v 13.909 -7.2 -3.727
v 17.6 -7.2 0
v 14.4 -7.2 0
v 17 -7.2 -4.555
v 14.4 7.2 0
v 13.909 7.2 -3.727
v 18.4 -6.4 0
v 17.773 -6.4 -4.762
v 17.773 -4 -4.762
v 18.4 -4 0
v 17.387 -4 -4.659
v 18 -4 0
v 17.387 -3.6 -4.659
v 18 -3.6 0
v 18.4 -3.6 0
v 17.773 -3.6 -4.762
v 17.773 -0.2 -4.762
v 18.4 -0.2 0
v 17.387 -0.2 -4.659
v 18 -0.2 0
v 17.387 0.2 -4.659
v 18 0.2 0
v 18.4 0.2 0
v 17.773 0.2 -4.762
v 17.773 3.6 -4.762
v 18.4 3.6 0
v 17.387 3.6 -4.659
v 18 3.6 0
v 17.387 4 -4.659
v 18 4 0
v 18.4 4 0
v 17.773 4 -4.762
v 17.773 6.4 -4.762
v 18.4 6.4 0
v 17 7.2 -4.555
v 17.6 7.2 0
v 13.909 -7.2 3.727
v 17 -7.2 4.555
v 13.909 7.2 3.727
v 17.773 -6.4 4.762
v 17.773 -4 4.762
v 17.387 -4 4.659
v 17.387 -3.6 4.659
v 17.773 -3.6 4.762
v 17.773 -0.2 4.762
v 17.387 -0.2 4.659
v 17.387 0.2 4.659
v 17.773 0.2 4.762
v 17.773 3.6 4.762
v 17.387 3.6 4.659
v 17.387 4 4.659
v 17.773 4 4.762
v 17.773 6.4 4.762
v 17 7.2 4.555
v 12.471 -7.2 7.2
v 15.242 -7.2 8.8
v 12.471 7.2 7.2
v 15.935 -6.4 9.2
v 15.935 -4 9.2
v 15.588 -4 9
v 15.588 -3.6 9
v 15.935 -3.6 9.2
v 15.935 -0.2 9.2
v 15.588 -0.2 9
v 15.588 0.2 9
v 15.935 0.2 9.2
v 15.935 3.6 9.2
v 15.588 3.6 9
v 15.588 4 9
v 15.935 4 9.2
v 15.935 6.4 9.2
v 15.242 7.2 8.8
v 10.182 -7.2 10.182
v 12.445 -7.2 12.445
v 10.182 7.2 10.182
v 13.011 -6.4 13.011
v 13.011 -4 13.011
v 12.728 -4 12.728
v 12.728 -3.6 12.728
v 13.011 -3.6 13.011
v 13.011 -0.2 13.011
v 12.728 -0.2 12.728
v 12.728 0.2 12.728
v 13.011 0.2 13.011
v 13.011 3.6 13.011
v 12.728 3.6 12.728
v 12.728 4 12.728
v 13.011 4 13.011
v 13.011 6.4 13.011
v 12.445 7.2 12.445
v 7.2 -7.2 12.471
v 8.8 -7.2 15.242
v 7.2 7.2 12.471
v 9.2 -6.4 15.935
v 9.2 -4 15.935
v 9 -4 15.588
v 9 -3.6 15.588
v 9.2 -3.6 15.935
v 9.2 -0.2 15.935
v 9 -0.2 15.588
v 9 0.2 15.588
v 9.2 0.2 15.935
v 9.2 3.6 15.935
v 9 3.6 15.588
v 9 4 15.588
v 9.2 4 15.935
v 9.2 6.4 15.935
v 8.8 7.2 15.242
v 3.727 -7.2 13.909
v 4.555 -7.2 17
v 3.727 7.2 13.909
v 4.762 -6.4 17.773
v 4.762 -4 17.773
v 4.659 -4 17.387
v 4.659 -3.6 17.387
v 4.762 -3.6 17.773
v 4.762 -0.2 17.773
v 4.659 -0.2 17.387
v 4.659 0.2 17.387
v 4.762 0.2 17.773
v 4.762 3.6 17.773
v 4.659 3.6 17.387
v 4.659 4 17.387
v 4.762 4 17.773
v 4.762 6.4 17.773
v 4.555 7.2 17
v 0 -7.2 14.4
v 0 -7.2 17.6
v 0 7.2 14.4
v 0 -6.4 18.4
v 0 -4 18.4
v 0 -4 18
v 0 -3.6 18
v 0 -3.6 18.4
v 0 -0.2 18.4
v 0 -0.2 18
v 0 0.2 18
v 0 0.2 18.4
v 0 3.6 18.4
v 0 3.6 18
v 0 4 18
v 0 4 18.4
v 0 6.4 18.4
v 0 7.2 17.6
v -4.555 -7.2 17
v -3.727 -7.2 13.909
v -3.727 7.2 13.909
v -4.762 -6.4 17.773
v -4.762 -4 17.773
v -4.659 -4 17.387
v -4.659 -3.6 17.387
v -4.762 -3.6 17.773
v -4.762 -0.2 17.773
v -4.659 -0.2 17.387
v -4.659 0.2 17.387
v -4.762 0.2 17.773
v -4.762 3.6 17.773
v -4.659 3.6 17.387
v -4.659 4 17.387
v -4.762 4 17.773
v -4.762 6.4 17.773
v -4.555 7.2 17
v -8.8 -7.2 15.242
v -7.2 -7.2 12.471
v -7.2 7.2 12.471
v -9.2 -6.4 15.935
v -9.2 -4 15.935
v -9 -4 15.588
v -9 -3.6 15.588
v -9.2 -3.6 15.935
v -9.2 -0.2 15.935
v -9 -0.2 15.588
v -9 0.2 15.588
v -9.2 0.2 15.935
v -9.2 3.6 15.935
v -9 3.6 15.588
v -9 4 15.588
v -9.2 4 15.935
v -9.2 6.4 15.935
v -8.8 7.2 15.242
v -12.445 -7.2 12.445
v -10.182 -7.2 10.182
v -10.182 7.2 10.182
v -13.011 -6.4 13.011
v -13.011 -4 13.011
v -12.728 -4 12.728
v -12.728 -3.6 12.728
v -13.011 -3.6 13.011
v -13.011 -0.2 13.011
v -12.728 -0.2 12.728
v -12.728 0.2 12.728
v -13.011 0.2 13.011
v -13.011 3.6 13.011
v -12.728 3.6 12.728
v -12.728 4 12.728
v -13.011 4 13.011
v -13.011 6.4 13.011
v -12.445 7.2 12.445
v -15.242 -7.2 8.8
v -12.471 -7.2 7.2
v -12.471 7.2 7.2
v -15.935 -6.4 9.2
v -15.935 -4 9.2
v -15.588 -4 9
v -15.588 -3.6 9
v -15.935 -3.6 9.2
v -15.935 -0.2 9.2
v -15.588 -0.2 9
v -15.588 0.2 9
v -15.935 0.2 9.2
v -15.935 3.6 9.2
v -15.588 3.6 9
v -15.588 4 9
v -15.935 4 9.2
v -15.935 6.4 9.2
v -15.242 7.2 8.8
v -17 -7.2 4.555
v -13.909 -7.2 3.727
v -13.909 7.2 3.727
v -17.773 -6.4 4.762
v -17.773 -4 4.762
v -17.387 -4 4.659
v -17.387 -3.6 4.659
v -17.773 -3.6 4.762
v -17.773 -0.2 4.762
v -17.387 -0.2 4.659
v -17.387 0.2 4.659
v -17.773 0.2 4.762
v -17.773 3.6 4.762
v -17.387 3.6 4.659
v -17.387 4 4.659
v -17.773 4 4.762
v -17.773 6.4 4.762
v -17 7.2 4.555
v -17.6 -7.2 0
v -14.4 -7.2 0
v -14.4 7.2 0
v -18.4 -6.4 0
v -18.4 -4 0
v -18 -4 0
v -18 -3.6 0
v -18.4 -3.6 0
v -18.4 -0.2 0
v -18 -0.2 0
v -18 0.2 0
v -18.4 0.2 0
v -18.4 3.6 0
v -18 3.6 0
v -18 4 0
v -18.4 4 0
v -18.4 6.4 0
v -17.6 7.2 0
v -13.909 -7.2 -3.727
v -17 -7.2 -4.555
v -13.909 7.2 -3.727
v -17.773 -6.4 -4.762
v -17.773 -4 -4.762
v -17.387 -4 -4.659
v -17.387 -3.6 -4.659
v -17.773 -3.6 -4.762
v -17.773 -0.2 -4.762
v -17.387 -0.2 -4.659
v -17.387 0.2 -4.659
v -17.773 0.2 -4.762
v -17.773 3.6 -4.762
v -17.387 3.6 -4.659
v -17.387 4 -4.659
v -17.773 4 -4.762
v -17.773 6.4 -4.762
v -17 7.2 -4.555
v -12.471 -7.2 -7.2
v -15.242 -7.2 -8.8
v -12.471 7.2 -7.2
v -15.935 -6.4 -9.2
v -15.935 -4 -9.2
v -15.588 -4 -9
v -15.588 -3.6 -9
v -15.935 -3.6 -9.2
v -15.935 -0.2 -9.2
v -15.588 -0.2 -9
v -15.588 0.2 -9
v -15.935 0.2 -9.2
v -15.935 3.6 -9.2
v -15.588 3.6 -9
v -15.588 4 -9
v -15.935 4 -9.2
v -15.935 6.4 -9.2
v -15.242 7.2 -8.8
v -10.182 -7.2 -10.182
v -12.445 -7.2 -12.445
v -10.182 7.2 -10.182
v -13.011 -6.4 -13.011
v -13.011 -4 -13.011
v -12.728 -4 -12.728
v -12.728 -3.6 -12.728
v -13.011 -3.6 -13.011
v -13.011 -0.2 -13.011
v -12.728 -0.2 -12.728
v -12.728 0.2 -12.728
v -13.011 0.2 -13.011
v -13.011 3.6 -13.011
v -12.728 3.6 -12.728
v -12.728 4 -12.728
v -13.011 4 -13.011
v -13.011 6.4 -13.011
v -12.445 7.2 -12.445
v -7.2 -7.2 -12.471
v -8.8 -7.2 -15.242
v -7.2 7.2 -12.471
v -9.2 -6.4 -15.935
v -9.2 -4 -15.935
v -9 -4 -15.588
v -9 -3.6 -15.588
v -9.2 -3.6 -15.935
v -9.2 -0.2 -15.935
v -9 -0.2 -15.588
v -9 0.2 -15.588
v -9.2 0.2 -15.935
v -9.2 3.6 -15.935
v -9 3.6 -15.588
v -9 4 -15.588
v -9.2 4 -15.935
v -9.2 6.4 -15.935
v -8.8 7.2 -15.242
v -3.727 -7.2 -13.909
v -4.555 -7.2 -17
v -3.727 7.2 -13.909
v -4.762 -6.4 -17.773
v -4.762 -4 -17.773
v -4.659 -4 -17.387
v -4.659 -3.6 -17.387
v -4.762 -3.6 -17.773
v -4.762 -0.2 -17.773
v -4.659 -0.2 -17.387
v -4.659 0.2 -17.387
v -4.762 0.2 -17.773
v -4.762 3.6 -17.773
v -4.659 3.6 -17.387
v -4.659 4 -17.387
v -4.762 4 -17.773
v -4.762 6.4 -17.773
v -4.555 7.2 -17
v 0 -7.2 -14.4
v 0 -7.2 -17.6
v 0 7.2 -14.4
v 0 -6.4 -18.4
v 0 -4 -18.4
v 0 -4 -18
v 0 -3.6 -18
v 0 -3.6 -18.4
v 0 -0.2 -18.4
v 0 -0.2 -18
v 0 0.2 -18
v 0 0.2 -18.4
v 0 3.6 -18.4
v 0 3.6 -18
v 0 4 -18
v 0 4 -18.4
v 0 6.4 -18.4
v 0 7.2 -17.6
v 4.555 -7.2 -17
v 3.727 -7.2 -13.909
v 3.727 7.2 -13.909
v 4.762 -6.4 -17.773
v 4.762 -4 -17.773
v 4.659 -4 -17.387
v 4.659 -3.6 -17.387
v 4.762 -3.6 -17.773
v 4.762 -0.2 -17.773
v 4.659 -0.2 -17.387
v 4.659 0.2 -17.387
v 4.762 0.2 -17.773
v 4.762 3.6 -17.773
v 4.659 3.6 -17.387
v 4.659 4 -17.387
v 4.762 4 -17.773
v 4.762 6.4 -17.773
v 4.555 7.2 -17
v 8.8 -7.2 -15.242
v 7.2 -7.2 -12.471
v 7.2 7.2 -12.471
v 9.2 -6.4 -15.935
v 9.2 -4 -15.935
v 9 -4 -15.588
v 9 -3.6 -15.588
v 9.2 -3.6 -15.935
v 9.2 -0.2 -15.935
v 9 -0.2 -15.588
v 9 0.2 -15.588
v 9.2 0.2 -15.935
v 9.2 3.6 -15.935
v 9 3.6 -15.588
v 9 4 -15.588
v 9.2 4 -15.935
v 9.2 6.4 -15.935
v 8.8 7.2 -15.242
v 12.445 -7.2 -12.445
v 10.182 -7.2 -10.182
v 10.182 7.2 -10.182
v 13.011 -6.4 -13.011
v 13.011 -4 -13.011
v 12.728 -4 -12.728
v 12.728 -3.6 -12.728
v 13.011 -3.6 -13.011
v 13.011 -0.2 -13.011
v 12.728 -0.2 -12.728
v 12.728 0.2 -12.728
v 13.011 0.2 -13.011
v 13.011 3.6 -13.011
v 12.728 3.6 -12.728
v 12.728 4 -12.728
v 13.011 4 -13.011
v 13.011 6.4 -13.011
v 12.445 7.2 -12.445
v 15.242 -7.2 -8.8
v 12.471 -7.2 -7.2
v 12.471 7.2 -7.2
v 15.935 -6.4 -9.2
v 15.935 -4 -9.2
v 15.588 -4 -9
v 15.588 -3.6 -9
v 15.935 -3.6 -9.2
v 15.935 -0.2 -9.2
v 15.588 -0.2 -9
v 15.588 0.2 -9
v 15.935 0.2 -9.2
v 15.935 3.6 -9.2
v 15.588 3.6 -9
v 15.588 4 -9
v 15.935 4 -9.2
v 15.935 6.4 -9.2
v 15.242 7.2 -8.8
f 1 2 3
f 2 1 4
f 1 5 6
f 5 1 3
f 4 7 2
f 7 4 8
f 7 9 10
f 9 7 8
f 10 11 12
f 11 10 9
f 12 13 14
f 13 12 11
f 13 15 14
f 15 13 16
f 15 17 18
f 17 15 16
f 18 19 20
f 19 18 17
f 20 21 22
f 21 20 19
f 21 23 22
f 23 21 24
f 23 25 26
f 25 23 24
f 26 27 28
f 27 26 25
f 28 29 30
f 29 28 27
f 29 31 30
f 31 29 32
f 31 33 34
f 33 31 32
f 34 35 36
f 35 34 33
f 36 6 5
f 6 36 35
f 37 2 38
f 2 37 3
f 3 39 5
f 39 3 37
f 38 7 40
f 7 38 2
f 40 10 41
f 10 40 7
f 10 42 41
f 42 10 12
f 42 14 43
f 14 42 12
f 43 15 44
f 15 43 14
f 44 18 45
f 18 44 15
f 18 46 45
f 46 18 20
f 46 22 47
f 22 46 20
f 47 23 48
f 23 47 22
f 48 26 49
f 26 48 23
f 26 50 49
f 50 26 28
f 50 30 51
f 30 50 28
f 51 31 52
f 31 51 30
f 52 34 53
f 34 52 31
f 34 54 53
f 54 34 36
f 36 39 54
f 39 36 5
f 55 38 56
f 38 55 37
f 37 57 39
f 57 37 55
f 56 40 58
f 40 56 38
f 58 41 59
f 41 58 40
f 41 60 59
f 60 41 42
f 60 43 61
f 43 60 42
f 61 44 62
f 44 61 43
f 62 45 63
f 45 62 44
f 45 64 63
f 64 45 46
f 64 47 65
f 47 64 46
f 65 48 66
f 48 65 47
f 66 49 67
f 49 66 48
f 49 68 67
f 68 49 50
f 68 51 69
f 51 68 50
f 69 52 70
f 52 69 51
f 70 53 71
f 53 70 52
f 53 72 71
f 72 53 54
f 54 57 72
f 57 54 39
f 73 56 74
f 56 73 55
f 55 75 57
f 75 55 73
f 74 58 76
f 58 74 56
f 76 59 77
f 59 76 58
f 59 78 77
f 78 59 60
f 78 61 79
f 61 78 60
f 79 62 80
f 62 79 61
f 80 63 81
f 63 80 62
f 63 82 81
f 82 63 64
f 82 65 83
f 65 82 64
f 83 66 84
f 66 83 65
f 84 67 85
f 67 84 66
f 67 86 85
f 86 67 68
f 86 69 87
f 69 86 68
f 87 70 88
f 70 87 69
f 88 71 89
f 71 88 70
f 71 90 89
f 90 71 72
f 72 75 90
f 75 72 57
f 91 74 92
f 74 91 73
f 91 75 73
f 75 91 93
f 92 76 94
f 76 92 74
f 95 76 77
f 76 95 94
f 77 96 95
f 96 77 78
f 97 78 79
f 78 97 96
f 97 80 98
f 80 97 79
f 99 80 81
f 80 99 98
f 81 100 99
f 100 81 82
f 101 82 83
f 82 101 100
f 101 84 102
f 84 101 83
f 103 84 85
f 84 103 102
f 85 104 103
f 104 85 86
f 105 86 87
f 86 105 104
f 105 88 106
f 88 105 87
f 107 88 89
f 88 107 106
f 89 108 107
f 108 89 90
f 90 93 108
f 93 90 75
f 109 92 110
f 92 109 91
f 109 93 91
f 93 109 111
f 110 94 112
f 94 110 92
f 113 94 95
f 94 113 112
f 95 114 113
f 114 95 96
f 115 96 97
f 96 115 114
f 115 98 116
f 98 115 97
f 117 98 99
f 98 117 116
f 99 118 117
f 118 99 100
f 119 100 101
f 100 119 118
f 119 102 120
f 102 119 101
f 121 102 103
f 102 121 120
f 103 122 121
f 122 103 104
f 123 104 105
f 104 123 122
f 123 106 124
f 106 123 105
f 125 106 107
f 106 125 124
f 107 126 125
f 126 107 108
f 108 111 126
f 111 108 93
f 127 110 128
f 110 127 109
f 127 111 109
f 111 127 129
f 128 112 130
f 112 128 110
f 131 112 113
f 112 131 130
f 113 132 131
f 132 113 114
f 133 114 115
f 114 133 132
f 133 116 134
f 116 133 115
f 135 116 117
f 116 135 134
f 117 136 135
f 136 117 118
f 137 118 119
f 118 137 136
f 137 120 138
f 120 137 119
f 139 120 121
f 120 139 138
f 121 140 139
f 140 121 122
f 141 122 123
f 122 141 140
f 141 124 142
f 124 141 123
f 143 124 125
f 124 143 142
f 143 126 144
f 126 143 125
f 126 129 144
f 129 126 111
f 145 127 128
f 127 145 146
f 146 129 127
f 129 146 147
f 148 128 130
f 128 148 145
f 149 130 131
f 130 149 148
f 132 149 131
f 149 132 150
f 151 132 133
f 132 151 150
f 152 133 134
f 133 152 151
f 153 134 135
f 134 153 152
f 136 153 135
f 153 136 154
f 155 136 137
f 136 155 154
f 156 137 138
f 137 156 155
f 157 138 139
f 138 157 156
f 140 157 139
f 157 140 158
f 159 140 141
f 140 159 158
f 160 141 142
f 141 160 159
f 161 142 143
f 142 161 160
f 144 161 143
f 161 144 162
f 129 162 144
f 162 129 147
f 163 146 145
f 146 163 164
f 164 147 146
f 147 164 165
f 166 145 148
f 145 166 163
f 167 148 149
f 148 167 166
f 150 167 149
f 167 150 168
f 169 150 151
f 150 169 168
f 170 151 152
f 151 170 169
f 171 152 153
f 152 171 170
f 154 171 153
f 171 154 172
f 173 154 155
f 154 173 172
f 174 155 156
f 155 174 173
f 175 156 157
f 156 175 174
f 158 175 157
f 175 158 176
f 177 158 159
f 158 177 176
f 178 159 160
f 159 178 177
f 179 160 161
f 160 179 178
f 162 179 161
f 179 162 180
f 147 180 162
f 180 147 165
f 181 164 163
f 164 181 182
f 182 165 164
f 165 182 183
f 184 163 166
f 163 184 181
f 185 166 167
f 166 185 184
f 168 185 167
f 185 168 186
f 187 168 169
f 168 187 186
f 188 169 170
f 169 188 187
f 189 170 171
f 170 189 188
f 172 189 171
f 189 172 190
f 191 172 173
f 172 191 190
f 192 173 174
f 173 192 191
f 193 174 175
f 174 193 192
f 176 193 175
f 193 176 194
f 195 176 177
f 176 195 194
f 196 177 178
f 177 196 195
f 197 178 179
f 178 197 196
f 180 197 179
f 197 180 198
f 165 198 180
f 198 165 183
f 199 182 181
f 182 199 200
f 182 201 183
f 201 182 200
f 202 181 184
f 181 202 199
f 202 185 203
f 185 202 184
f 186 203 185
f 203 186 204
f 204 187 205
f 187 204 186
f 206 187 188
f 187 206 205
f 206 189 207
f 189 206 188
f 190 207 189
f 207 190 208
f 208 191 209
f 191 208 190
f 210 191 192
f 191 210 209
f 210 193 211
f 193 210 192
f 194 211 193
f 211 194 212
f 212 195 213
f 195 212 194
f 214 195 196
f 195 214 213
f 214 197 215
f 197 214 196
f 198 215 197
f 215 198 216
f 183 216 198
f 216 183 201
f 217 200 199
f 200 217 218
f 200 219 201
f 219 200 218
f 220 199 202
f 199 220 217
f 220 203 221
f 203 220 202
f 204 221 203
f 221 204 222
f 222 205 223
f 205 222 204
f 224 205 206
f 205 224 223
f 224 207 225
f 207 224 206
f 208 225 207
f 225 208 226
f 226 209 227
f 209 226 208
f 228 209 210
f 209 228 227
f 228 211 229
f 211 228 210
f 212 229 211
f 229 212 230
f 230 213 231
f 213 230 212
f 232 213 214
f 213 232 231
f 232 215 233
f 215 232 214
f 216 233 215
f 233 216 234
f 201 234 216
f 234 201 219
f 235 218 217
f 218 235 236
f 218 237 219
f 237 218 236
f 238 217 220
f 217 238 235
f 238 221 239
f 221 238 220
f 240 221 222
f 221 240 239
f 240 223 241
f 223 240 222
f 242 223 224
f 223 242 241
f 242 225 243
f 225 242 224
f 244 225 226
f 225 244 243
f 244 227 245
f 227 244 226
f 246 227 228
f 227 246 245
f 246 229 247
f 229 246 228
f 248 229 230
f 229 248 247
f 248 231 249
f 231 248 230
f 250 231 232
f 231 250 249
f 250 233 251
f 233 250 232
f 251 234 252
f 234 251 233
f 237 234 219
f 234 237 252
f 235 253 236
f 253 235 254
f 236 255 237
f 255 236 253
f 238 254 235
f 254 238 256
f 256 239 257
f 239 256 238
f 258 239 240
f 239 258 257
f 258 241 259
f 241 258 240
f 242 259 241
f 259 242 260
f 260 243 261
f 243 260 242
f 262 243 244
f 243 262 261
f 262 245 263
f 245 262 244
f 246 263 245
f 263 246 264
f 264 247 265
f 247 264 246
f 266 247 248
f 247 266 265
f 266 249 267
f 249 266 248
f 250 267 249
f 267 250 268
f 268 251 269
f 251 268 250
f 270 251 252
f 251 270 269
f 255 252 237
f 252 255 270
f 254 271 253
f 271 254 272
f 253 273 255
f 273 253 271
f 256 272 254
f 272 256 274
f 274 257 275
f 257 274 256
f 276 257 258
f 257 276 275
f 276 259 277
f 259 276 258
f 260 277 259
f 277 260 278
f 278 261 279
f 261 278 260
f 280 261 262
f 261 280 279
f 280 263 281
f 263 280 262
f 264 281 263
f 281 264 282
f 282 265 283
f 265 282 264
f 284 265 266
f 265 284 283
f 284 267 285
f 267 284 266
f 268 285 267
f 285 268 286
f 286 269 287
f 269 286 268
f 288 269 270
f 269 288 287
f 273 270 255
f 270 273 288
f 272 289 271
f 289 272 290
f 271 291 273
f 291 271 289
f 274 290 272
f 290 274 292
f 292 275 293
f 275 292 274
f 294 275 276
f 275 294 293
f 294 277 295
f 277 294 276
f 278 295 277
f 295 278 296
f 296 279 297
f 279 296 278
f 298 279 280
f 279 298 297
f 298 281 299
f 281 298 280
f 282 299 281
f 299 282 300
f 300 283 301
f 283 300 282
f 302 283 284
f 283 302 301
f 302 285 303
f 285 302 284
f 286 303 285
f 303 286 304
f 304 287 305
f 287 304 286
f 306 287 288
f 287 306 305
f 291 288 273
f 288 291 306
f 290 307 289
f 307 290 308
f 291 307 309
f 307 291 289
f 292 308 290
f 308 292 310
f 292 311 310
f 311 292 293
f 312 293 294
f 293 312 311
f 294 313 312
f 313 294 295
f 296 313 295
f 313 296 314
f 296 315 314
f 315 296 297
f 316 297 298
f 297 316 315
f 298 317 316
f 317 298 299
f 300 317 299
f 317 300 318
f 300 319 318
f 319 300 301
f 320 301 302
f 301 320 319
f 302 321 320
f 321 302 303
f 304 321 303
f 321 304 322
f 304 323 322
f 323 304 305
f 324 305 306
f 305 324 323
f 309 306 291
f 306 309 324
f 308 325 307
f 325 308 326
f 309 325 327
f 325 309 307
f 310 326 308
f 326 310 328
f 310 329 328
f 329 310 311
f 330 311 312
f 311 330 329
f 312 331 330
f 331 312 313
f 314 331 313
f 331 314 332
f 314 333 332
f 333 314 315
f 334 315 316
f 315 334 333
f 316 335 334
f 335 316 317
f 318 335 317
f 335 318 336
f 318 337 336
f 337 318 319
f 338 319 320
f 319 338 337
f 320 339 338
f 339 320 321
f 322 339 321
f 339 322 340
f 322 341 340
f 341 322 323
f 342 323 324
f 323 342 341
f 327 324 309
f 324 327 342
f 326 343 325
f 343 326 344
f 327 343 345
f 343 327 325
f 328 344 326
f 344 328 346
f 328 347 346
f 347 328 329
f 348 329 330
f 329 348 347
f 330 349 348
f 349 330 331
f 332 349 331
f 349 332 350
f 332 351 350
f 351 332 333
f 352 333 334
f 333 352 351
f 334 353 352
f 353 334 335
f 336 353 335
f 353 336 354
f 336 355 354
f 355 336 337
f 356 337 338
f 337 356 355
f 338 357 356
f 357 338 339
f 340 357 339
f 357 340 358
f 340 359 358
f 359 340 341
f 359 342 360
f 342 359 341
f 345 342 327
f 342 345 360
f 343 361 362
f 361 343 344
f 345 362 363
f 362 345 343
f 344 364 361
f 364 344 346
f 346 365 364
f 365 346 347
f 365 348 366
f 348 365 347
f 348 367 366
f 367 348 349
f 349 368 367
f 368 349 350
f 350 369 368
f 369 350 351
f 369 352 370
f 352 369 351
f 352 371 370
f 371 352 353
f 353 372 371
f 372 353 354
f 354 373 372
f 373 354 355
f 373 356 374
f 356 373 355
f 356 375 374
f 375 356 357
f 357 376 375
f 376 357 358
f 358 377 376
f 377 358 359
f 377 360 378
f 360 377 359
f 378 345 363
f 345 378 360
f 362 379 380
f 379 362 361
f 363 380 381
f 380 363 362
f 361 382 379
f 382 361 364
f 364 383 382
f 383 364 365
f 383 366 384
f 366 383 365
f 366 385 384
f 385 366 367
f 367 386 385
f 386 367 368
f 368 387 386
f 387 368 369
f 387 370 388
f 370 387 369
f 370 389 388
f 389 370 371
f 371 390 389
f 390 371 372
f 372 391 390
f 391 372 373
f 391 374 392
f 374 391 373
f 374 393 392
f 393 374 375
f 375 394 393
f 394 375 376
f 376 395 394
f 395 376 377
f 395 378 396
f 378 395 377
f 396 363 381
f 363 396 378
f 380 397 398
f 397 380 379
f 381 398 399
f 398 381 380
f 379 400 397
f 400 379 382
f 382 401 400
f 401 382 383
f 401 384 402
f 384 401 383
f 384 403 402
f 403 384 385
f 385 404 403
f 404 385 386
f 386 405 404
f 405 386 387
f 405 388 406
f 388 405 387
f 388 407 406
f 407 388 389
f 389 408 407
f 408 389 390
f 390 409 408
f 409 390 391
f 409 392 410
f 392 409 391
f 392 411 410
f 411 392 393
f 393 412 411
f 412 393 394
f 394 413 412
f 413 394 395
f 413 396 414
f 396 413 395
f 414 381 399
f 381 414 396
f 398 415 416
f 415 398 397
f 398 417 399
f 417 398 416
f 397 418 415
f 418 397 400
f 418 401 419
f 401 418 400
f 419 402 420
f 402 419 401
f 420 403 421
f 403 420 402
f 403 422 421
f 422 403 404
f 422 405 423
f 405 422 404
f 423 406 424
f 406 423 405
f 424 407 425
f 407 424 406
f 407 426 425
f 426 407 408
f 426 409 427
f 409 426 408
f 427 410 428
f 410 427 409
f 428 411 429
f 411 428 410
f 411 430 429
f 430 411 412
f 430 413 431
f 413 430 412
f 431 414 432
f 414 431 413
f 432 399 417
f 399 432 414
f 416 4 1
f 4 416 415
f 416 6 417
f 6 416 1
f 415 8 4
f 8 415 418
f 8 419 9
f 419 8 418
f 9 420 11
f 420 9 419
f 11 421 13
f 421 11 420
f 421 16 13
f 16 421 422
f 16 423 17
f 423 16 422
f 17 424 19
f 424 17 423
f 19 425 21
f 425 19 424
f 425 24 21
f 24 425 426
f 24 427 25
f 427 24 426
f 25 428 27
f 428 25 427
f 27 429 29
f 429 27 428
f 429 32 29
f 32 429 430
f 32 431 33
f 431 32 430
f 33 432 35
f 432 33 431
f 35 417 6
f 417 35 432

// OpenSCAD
// file: s/u9031s01.scad
use <../../lib.scad>
function ldraw_lib__s__u9031s01() = [
// 0 ~Tyre 36.8 x 14 ZR Segment
// 0 Name: s\u9031s01.dat
// 0 Author: Sven Moritz Hein [smhltec]
// 0 !LDRAW_ORG Subpart UPDATE 2011-01
// 0 !LICENSE Licensed under CC BY 2.0 and CC BY 4.0 : see CAreadme.txt
// 
// 0 BFC CERTIFY CCW
  [0,"BFC","CERTIFY"],
  [0,"BFC","CCW"],
// 
// 0 !HISTORY 2007-06-22 [mikeheide] BFC'ed
// 0 !HISTORY 2011-07-25 [PTadmin] Official Update 2011-01
// 
// 
// 4 16 36 0 -18 34.7733 9.3175 -18 42.5007 11.388 -18 44 0 -18
  [4,16,36,0,-18,34.7733,9.3175,-18,42.5007,11.388,-18,44,0,-18],
// 4 16 36 0 -18 36 0 18 34.7733 9.3175 18 34.7733 9.3175 -18
  [4,16,36,0,-18,36,0,18,34.7733,9.3175,18,34.7733,9.3175,-18],
// 2 24 44 0 -18 42.5007 11.388 -18
  [2,24,44,0,-18,42.5007,11.388,-18],
// 2 24 36 0 -18 34.7733 9.3175 -18
  [2,24,36,0,-18,34.7733,9.3175,-18],
// 4 16 44 0 -18 42.5007 11.388 -18 44.4326 11.9056 -16 46 0 -16
  [4,16,44,0,-18,42.5007,11.388,-18,44.4326,11.9056,-16,46,0,-16],
// 5 24 44 0 -18 46 0 -16 42.5007 -11.388 -18 42.5007 11.388 -18
  [5,24,44,0,-18,46,0,-16,42.5007,-11.388,-18,42.5007,11.388,-18],
// 2 24 46 0 -16 44.4326 11.9056 -16
  [2,24,46,0,-16,44.4326,11.9056,-16],
// 4 16 46 0 -16 44.4326 11.9056 -16 44.4326 11.9056 -10 46 0 -10
  [4,16,46,0,-16,44.4326,11.9056,-16,44.4326,11.9056,-10,46,0,-10],
// 5 24 46 0 -16 46 0 -10 44.4326 -11.9057 -16 44.4326 11.9056 -16
  [5,24,46,0,-16,46,0,-10,44.4326,-11.9057,-16,44.4326,11.9056,-16],
// 2 24 46 0 -10 44.4326 11.9056 -10
  [2,24,46,0,-10,44.4326,11.9056,-10],
// 4 16 46 0 -10 44.4326 11.9056 -10 43.4667 11.6468 -10 45 0 -10
  [4,16,46,0,-10,44.4326,11.9056,-10,43.4667,11.6468,-10,45,0,-10],
// 2 24 45 0 -10 43.4667 11.6468 -10
  [2,24,45,0,-10,43.4667,11.6468,-10],
// 4 16 45 0 -10 43.4667 11.6468 -10 43.4667 11.6468 -9 45 0 -9
  [4,16,45,0,-10,43.4667,11.6468,-10,43.4667,11.6468,-9,45,0,-9],
// 5 24 45 0 -10 45 0 -9 43.4667 -11.6469 -10 43.4667 11.6468 -10
  [5,24,45,0,-10,45,0,-9,43.4667,-11.6469,-10,43.4667,11.6468,-10],
// 2 24 45 0 -9 43.4667 11.6468 -9
  [2,24,45,0,-9,43.4667,11.6468,-9],
// 4 16 45 0 -9 43.4667 11.6468 -9 44.4326 11.9056 -9 46 0 -9
  [4,16,45,0,-9,43.4667,11.6468,-9,44.4326,11.9056,-9,46,0,-9],
// 2 24 46 0 -9 44.4326 11.9056 -9
  [2,24,46,0,-9,44.4326,11.9056,-9],
// 4 16 46 0 -9 44.4326 11.9056 -9 44.4326 11.9056 -0.5 46 0 -0.5
  [4,16,46,0,-9,44.4326,11.9056,-9,44.4326,11.9056,-0.5,46,0,-0.5],
// 5 24 46 0 -9 46 0 -0.5 44.4326 -11.9057 -9 44.4326 11.9056 -9
  [5,24,46,0,-9,46,0,-0.5,44.4326,-11.9057,-9,44.4326,11.9056,-9],
// 2 24 46 0 -0.5 44.4326 11.9056 -0.5
  [2,24,46,0,-0.5,44.4326,11.9056,-0.5],
// 4 16 46 0 -0.5 44.4326 11.9056 -0.5 43.4667 11.6468 -0.5 45 0 -0.5
  [4,16,46,0,-0.5,44.4326,11.9056,-0.5,43.4667,11.6468,-0.5,45,0,-0.5],
// 2 24 45 0 -0.5 43.4667 11.6468 -0.5
  [2,24,45,0,-0.5,43.4667,11.6468,-0.5],
// 4 16 45 0 -0.5 43.4667 11.6468 -0.5 43.4667 11.6468 0.5 45 0 0.5
  [4,16,45,0,-0.5,43.4667,11.6468,-0.5,43.4667,11.6468,0.5,45,0,0.5],
// 5 24 45 0 -0.5 45 0 0.5 43.4667 -11.6469 -0.5 43.4667 11.6468 -0.5
  [5,24,45,0,-0.5,45,0,0.5,43.4667,-11.6469,-0.5,43.4667,11.6468,-0.5],
// 2 24 45 0 0.5 43.4667 11.6468 0.5
  [2,24,45,0,0.5,43.4667,11.6468,0.5],
// 4 16 45 0 0.5 43.4667 11.6468 0.5 44.4326 11.9056 0.5 46 0 0.5
  [4,16,45,0,0.5,43.4667,11.6468,0.5,44.4326,11.9056,0.5,46,0,0.5],
// 2 24 46 0 0.5 44.4326 11.9056 0.5
  [2,24,46,0,0.5,44.4326,11.9056,0.5],
// 4 16 46 0 0.5 44.4326 11.9056 0.5 44.4326 11.9056 9 46 0 9
  [4,16,46,0,0.5,44.4326,11.9056,0.5,44.4326,11.9056,9,46,0,9],
// 5 24 46 0 0.5 46 0 9 44.4326 -11.9057 0.5 44.4326 11.9056 0.5
  [5,24,46,0,0.5,46,0,9,44.4326,-11.9057,0.5,44.4326,11.9056,0.5],
// 2 24 46 0 9 44.4326 11.9056 9
  [2,24,46,0,9,44.4326,11.9056,9],
// 4 16 46 0 9 44.4326 11.9056 9 43.4667 11.6468 9 45 0 9
  [4,16,46,0,9,44.4326,11.9056,9,43.4667,11.6468,9,45,0,9],
// 2 24 45 0 9 43.4667 11.6468 9
  [2,24,45,0,9,43.4667,11.6468,9],
// 4 16 45 0 9 43.4667 11.6468 9 43.4667 11.6468 10 45 0 10
  [4,16,45,0,9,43.4667,11.6468,9,43.4667,11.6468,10,45,0,10],
// 5 24 45 0 9 45 0 10 43.4667 -11.6469 9 43.4667 11.6468 9
  [5,24,45,0,9,45,0,10,43.4667,-11.6469,9,43.4667,11.6468,9],
// 2 24 45 0 10 43.4667 11.6468 10
  [2,24,45,0,10,43.4667,11.6468,10],
// 4 16 45 0 10 43.4667 11.6468 10 44.4326 11.9056 10 46 0 10
  [4,16,45,0,10,43.4667,11.6468,10,44.4326,11.9056,10,46,0,10],
// 2 24 46 0 10 44.4326 11.9056 10
  [2,24,46,0,10,44.4326,11.9056,10],
// 4 16 46 0 10 44.4326 11.9056 10 44.4326 11.9056 16 46 0 16
  [4,16,46,0,10,44.4326,11.9056,10,44.4326,11.9056,16,46,0,16],
// 5 24 46 0 10 46 0 16 44.4326 -11.9057 10 44.4326 11.9056 10
  [5,24,46,0,10,46,0,16,44.4326,-11.9057,10,44.4326,11.9056,10],
// 2 24 46 0 16 44.4326 11.9056 16
  [2,24,46,0,16,44.4326,11.9056,16],
// 4 16 46 0 16 44.4326 11.9056 16 42.5007 11.388 18 44 0 18
  [4,16,46,0,16,44.4326,11.9056,16,42.5007,11.388,18,44,0,18],
// 5 24 46 0 16 44 0 18 44.4326 -11.9057 16 44.4326 11.9056 16
  [5,24,46,0,16,44,0,18,44.4326,-11.9057,16,44.4326,11.9056,16],
// 2 24 44 0 18 42.5007 11.388 18
  [2,24,44,0,18,42.5007,11.388,18],
// 4 16 44 0 18 42.5007 11.388 18 34.7733 9.3175 18 36 0 18
  [4,16,44,0,18,42.5007,11.388,18,34.7733,9.3175,18,36,0,18],
// 2 24 36 0 18 34.7733 9.3175 18
  [2,24,36,0,18,34.7733,9.3175,18],
// 0
];
makepoly(ldraw_lib__s__u9031s01(), line=0.2);
// main file
use <../lib.scad>
use <s/u9031s01.scad>
function ldraw_lib__u9031() = [
// 0 ~Tyre 36.8 x 14 ZR (Hard Rubber)
// 0 Name: u9031.dat
// 0 Author: Sven Moritz Hein [smhltec]
// 0 !LDRAW_ORG Part UPDATE 2011-01
// 0 !LICENSE Licensed under CC BY 2.0 and CC BY 4.0 : see CAreadme.txt
// 
// 0 BFC CERTIFY CCW
  [0,"BFC","CERTIFY"],
  [0,"BFC","CCW"],
// 
// 0 !HISTORY 2007-06-22 [mikeheide] changed title and filename
// 0 !HISTORY 2011-07-25 [PTadmin] Official Update 2011-01
// 
// 
// 1 16 0 0 0 1 0 0 0 1 0 0 0 1 s\u9031s01.dat
  [1,16,0,0,0,1,0,0,0,1,0,0,0,1, ldraw_lib__s__u9031s01()],
// 1 16 0 0 0 0.965926 0.258819 0 -0.258819 0.965926 0 0 0 1 s\u9031s01.dat
  [1,16,0,0,0,0.965926,0.258819,0,-0.258819,0.965926,0,0,0,1, ldraw_lib__s__u9031s01()],
// 1 16 0 0 0 0.866025 0.5 0 -0.5 0.866025 0 0 0 1 s\u9031s01.dat
  [1,16,0,0,0,0.866025,0.5,0,-0.5,0.866025,0,0,0,1, ldraw_lib__s__u9031s01()],
// 1 16 0 0 0 0.707107 0.707107 0 -0.707107 0.707107 0 0 0 1 s\u9031s01.dat
  [1,16,0,0,0,0.707107,0.707107,0,-0.707107,0.707107,0,0,0,1, ldraw_lib__s__u9031s01()],
// 1 16 0 0 0 0.5 0.866025 0 -0.866025 0.5 0 0 0 1 s\u9031s01.dat
  [1,16,0,0,0,0.5,0.866025,0,-0.866025,0.5,0,0,0,1, ldraw_lib__s__u9031s01()],
// 1 16 0 0 0 0.258819 0.965926 0 -0.965926 0.258819 0 0 0 1 s\u9031s01.dat
  [1,16,0,0,0,0.258819,0.965926,0,-0.965926,0.258819,0,0,0,1, ldraw_lib__s__u9031s01()],
// 1 16 0 0 0 0 1 0 -1 0 0 0 0 1 s\u9031s01.dat
  [1,16,0,0,0,0,1,0,-1,0,0,0,0,1, ldraw_lib__s__u9031s01()],
// 1 16 0 0 0 -0.258819 0.965926 0 -0.965926 -0.258819 0 0 0 1 s\u9031s01.dat
  [1,16,0,0,0,-0.258819,0.965926,0,-0.965926,-0.258819,0,0,0,1, ldraw_lib__s__u9031s01()],
// 1 16 0 0 0 -0.5 0.866025 0 -0.866025 -0.5 0 0 0 1 s\u9031s01.dat
  [1,16,0,0,0,-0.5,0.866025,0,-0.866025,-0.5,0,0,0,1, ldraw_lib__s__u9031s01()],
// 1 16 0 0 0 -0.707107 0.707107 0 -0.707107 -0.707107 0 0 0 1 s\u9031s01.dat
  [1,16,0,0,0,-0.707107,0.707107,0,-0.707107,-0.707107,0,0,0,1, ldraw_lib__s__u9031s01()],
// 1 16 0 0 0 -0.866025 0.5 0 -0.5 -0.866025 0 0 0 1 s\u9031s01.dat
  [1,16,0,0,0,-0.866025,0.5,0,-0.5,-0.866025,0,0,0,1, ldraw_lib__s__u9031s01()],
// 1 16 0 0 0 -0.965926 0.258819 0 -0.258819 -0.965926 0 0 0 1 s\u9031s01.dat
  [1,16,0,0,0,-0.965926,0.258819,0,-0.258819,-0.965926,0,0,0,1, ldraw_lib__s__u9031s01()],
// 1 16 0 0 0 -1 0 0 0 -1 0 0 0 1 s\u9031s01.dat
  [1,16,0,0,0,-1,0,0,0,-1,0,0,0,1, ldraw_lib__s__u9031s01()],
// 1 16 0 0 0 -0.965926 -0.258819 0 0.258819 -0.965926 0 0 0 1 s\u9031s01.dat
  [1,16,0,0,0,-0.965926,-0.258819,0,0.258819,-0.965926,0,0,0,1, ldraw_lib__s__u9031s01()],
// 1 16 0 0 0 -0.866025 -0.5 0 0.5 -0.866025 0 0 0 1 s\u9031s01.dat
  [1,16,0,0,0,-0.866025,-0.5,0,0.5,-0.866025,0,0,0,1, ldraw_lib__s__u9031s01()],
// 1 16 0 0 0 -0.707107 -0.707107 0 0.707107 -0.707107 0 0 0 1 s\u9031s01.dat
  [1,16,0,0,0,-0.707107,-0.707107,0,0.707107,-0.707107,0,0,0,1, ldraw_lib__s__u9031s01()],
// 1 16 0 0 0 -0.5 -0.866025 0 0.866025 -0.5 0 0 0 1 s\u9031s01.dat
  [1,16,0,0,0,-0.5,-0.866025,0,0.866025,-0.5,0,0,0,1, ldraw_lib__s__u9031s01()],
// 1 16 0 0 0 -0.258819 -0.965926 0 0.965926 -0.258819 0 0 0 1 s\u9031s01.dat
  [1,16,0,0,0,-0.258819,-0.965926,0,0.965926,-0.258819,0,0,0,1, ldraw_lib__s__u9031s01()],
// 1 16 0 0 0 0 -1 0 1 0 0 0 0 1 s\u9031s01.dat
  [1,16,0,0,0,0,-1,0,1,0,0,0,0,1, ldraw_lib__s__u9031s01()],
// 1 16 0 0 0 0.258819 -0.965926 0 0.965926 0.258819 0 0 0 1 s\u9031s01.dat
  [1,16,0,0,0,0.258819,-0.965926,0,0.965926,0.258819,0,0,0,1, ldraw_lib__s__u9031s01()],
// 1 16 0 0 0 0.5 -0.866025 0 0.866025 0.5 0 0 0 1 s\u9031s01.dat
  [1,16,0,0,0,0.5,-0.866025,0,0.866025,0.5,0,0,0,1, ldraw_lib__s__u9031s01()],
// 1 16 0 0 0 0.707107 -0.707107 0 0.707107 0.707107 0 0 0 1 s\u9031s01.dat
  [1,16,0,0,0,0.707107,-0.707107,0,0.707107,0.707107,0,0,0,1, ldraw_lib__s__u9031s01()],
// 1 16 0 0 0 0.866025 -0.5 0 0.5 0.866025 0 0 0 1 s\u9031s01.dat
  [1,16,0,0,0,0.866025,-0.5,0,0.5,0.866025,0,0,0,1, ldraw_lib__s__u9031s01()],
// 1 16 0 0 0 0.965926 -0.258819 0 0.258819 0.965926 0 0 0 1 s\u9031s01.dat
  [1,16,0,0,0,0.965926,-0.258819,0,0.258819,0.965926,0,0,0,1, ldraw_lib__s__u9031s01()],
// 0 //
];
makepoly(ldraw_lib__u9031(), line=0.2);
